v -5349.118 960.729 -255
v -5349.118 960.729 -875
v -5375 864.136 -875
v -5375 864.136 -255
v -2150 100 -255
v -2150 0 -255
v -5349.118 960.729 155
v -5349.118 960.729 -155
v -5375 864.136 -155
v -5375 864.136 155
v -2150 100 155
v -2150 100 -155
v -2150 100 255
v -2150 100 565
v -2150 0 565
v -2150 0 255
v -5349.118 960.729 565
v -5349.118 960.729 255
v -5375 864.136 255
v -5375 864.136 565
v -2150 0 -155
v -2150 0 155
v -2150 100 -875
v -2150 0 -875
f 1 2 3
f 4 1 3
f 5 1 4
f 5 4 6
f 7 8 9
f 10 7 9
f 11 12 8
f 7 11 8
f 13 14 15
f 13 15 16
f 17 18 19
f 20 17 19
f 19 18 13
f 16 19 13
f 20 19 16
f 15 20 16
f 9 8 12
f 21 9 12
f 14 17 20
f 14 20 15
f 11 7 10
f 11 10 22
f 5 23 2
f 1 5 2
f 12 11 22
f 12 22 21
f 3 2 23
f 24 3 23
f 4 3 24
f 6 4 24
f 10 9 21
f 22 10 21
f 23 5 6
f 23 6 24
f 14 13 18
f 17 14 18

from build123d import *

# Parameters (mm, degrees)
SKETCH1_W                = 4300
SKETCH1_H                = 620
BOSS_EXTRUDE1_DEPTH      = 100
SKETCH1_H_2              = 310
BOSS_EXTRUDE1_2_DEPTH    = 100
BOSS_EXTRUDE1_3_DEPTH    = 100
BOSS_EXTRUDE2_DEPTH      = 565
BOSS_EXTRUDE2_DEPTH_BACK = 875
CUT_EXTRUDE1_DEPTH       = 5514.356867062
CUT_EXTRUDE1_DEPTH_BACK  = 5514.356867062
SKETCH3_W                = 3725
SKETCH3_H                = 100
BOSS_EXTRUDE3_REACH      = 5531.851
SKETCH4_W                = 100
SKETCH4_H                = 310
SKETCH4_H_2              = 620
SKETCH5_W                = 4300
SKETCH5_H                = 1440
CUT_EXTRUDE2_DEPTH       = 1771


with BuildPart() as part:
    # Sketch1 → Boss-Extrude1 (new body)
    with BuildSketch(Plane(origin=(0, 0, 0), x_dir=(1, 0, 0), z_dir=(0, 1, 0))):
        with Locations((0, 565)):
            Rectangle(SKETCH1_W, SKETCH1_H)
    extrude(amount=BOSS_EXTRUDE1_DEPTH)



with BuildPart() as body_2:
    # Sketch1 → Boss-Extrude1 2 (new body)
    with BuildSketch(Plane(origin=(0, 0, 0), x_dir=(1, 0, 0), z_dir=(0, 1, 0))):
        Rectangle(SKETCH1_W, SKETCH1_H_2)
    extrude(amount=BOSS_EXTRUDE1_2_DEPTH)


with BuildPart() as body_3:
    # Sketch1 → Boss-Extrude1 3 (new body)
    with BuildSketch(Plane(origin=(0, 0, 0), x_dir=(1, 0, 0), z_dir=(0, 1, 0))):
        with Locations((0, -410)):
            Rectangle(SKETCH1_W, SKETCH1_H_2)
    extrude(amount=BOSS_EXTRUDE1_3_DEPTH)


with BuildPart() as part_1:
    add(part.part)

    add(body_2.part)  # Boss-Extrude2 merges body 2

    add(body_3.part)  # Boss-Extrude2 merges body 3
    # Sketch2 → Boss-Extrude2 (add, two sides: drawn at the far end of the back side and taken through both)
    with BuildSketch(Plane.XY.offset(-BOSS_EXTRUDE2_DEPTH_BACK)):
        Polygon((-2150, 100), (-5349.11809549, 960.728728219), (-5375, 864.13614559), (-2150, 0), align=None)
    extrude(amount=BOSS_EXTRUDE2_DEPTH + BOSS_EXTRUDE2_DEPTH_BACK)

    # Sketch3 → Cut-Extrude1 (cut, two sides: drawn at the far end of the back side and taken through both)
    with BuildSketch(Plane(origin=(0, 100, 0), x_dir=(1, 0, 0), z_dir=(0, 1, 0)).offset(-CUT_EXTRUDE1_DEPTH_BACK)):
        with Locations((-4012.5, 205)):
            Rectangle(SKETCH3_W, SKETCH3_H)
        with Locations((-4012.5, -205)):
            Rectangle(SKETCH3_W, SKETCH3_H)
    extrude(amount=CUT_EXTRUDE1_DEPTH + CUT_EXTRUDE1_DEPTH_BACK, mode=Mode.SUBTRACT)


with BuildPart() as cut_extrude1_piece_1:
    # of the separate pieces the step leaves, piece 1, a body of its own (cut_extrude1_pieces)
    add(part_1.part.solids().sort_by_distance((2150, 0, -875))[0])



with BuildPart() as cut_extrude1_piece_2:
    # of the separate pieces the step leaves, piece 2, a body of its own (cut_extrude1_pieces)
    add(part_1.part.solids().sort_by_distance((-5375, 864.13614559, -155))[0])


with BuildPart() as cut_extrude1_piece_3:
    # of the separate pieces the step leaves, piece 3, a body of its own (cut_extrude1_pieces)
    add(part_1.part.solids().sort_by_distance((-5375, 864.13614559, 255))[0])


with BuildPart() as cut_extrude1_piece_1_1:
    add(cut_extrude1_piece_1.part)

    add(cut_extrude1_piece_2.part)  # Boss-Extrude3 merges Cut-Extrude1 piece 2

    add(cut_extrude1_piece_3.part)  # Boss-Extrude3 merges Cut-Extrude1 piece 3
    # Boss-Extrude3: up to this plane
    boss_extrude3_end = Plane(origin=(-3266.534841529, -342.939503471, -3125), z_dir=(0.003352354687718555, 0.9999943808432364, 0))
    # Sketch4 → Boss-Extrude3 (add, up to the surface)
    with BuildSketch(Plane.XZ, mode=Mode.PRIVATE) as boss_extrude3_sk1:
        with Locations((-2100, 410)):
            Rectangle(SKETCH4_W, SKETCH4_H)
    boss_extrude3_tool1 = split(extrude(boss_extrude3_sk1.sketch, amount=BOSS_EXTRUDE3_REACH, mode=Mode.PRIVATE), bisect_by=boss_extrude3_end, keep=Keep.BOTH, mode=Mode.PRIVATE)
    add(boss_extrude3_tool1.solids().sort_by_distance((-2100, 0, 410))[0])
    # Sketch4 → Boss-Extrude3 (add, up to the surface)
    with BuildSketch(Plane.XZ, mode=Mode.PRIVATE) as boss_extrude3_sk2:
        with Locations((-2100, 0)):
            Rectangle(SKETCH4_W, SKETCH4_H)
    boss_extrude3_tool2 = split(extrude(boss_extrude3_sk2.sketch, amount=BOSS_EXTRUDE3_REACH, mode=Mode.PRIVATE), bisect_by=boss_extrude3_end, keep=Keep.BOTH, mode=Mode.PRIVATE)
    add(boss_extrude3_tool2.solids().sort_by_distance((-2100, 0, 0))[0])
    # Sketch4 → Boss-Extrude3 (add, up to the surface)
    with BuildSketch(Plane.XZ, mode=Mode.PRIVATE) as boss_extrude3_sk3:
        with Locations((-2100, -565)):
            Rectangle(SKETCH4_W, SKETCH4_H_2)
    boss_extrude3_tool3 = split(extrude(boss_extrude3_sk3.sketch, amount=BOSS_EXTRUDE3_REACH, mode=Mode.PRIVATE), bisect_by=boss_extrude3_end, keep=Keep.BOTH, mode=Mode.PRIVATE)
    add(boss_extrude3_tool3.solids().sort_by_distance((-2100, 0, -565))[0])
    # Sketch4 → Boss-Extrude3 (add, up to the surface)
    with BuildSketch(Plane.XZ, mode=Mode.PRIVATE) as boss_extrude3_sk4:
        with Locations((2100, 410)):
            Rectangle(SKETCH4_W, SKETCH4_H)
    boss_extrude3_tool4 = split(extrude(boss_extrude3_sk4.sketch, amount=BOSS_EXTRUDE3_REACH, mode=Mode.PRIVATE), bisect_by=boss_extrude3_end, keep=Keep.BOTH, mode=Mode.PRIVATE)
    add(boss_extrude3_tool4.solids().sort_by_distance((2100, 0, 410))[0])
    # Sketch4 → Boss-Extrude3 (add, up to the surface)
    with BuildSketch(Plane.XZ, mode=Mode.PRIVATE) as boss_extrude3_sk5:
        with Locations((2100, 0)):
            Rectangle(SKETCH4_W, SKETCH4_H)
    boss_extrude3_tool5 = split(extrude(boss_extrude3_sk5.sketch, amount=BOSS_EXTRUDE3_REACH, mode=Mode.PRIVATE), bisect_by=boss_extrude3_end, keep=Keep.BOTH, mode=Mode.PRIVATE)
    add(boss_extrude3_tool5.solids().sort_by_distance((2100, 0, 0))[0])
    # Sketch4 → Boss-Extrude3 (add, up to the surface)
    with BuildSketch(Plane.XZ, mode=Mode.PRIVATE) as boss_extrude3_sk6:
        with Locations((2100, -565)):
            Rectangle(SKETCH4_W, SKETCH4_H_2)
    boss_extrude3_tool6 = split(extrude(boss_extrude3_sk6.sketch, amount=BOSS_EXTRUDE3_REACH, mode=Mode.PRIVATE), bisect_by=boss_extrude3_end, keep=Keep.BOTH, mode=Mode.PRIVATE)
    add(boss_extrude3_tool6.solids().sort_by_distance((2100, 0, -565))[0])

    # Sketch5 → Cut-Extrude2 (cut)
    with BuildSketch(Plane(origin=(0, 100, 0), x_dir=(1, 0, 0), z_dir=(0, 1, 0))):
        with Locations((0, 155)):
            Rectangle(SKETCH5_W, SKETCH5_H)
    extrude(amount=-CUT_EXTRUDE2_DEPTH, mode=Mode.SUBTRACT)


solid = cut_extrude1_piece_1_1.part
